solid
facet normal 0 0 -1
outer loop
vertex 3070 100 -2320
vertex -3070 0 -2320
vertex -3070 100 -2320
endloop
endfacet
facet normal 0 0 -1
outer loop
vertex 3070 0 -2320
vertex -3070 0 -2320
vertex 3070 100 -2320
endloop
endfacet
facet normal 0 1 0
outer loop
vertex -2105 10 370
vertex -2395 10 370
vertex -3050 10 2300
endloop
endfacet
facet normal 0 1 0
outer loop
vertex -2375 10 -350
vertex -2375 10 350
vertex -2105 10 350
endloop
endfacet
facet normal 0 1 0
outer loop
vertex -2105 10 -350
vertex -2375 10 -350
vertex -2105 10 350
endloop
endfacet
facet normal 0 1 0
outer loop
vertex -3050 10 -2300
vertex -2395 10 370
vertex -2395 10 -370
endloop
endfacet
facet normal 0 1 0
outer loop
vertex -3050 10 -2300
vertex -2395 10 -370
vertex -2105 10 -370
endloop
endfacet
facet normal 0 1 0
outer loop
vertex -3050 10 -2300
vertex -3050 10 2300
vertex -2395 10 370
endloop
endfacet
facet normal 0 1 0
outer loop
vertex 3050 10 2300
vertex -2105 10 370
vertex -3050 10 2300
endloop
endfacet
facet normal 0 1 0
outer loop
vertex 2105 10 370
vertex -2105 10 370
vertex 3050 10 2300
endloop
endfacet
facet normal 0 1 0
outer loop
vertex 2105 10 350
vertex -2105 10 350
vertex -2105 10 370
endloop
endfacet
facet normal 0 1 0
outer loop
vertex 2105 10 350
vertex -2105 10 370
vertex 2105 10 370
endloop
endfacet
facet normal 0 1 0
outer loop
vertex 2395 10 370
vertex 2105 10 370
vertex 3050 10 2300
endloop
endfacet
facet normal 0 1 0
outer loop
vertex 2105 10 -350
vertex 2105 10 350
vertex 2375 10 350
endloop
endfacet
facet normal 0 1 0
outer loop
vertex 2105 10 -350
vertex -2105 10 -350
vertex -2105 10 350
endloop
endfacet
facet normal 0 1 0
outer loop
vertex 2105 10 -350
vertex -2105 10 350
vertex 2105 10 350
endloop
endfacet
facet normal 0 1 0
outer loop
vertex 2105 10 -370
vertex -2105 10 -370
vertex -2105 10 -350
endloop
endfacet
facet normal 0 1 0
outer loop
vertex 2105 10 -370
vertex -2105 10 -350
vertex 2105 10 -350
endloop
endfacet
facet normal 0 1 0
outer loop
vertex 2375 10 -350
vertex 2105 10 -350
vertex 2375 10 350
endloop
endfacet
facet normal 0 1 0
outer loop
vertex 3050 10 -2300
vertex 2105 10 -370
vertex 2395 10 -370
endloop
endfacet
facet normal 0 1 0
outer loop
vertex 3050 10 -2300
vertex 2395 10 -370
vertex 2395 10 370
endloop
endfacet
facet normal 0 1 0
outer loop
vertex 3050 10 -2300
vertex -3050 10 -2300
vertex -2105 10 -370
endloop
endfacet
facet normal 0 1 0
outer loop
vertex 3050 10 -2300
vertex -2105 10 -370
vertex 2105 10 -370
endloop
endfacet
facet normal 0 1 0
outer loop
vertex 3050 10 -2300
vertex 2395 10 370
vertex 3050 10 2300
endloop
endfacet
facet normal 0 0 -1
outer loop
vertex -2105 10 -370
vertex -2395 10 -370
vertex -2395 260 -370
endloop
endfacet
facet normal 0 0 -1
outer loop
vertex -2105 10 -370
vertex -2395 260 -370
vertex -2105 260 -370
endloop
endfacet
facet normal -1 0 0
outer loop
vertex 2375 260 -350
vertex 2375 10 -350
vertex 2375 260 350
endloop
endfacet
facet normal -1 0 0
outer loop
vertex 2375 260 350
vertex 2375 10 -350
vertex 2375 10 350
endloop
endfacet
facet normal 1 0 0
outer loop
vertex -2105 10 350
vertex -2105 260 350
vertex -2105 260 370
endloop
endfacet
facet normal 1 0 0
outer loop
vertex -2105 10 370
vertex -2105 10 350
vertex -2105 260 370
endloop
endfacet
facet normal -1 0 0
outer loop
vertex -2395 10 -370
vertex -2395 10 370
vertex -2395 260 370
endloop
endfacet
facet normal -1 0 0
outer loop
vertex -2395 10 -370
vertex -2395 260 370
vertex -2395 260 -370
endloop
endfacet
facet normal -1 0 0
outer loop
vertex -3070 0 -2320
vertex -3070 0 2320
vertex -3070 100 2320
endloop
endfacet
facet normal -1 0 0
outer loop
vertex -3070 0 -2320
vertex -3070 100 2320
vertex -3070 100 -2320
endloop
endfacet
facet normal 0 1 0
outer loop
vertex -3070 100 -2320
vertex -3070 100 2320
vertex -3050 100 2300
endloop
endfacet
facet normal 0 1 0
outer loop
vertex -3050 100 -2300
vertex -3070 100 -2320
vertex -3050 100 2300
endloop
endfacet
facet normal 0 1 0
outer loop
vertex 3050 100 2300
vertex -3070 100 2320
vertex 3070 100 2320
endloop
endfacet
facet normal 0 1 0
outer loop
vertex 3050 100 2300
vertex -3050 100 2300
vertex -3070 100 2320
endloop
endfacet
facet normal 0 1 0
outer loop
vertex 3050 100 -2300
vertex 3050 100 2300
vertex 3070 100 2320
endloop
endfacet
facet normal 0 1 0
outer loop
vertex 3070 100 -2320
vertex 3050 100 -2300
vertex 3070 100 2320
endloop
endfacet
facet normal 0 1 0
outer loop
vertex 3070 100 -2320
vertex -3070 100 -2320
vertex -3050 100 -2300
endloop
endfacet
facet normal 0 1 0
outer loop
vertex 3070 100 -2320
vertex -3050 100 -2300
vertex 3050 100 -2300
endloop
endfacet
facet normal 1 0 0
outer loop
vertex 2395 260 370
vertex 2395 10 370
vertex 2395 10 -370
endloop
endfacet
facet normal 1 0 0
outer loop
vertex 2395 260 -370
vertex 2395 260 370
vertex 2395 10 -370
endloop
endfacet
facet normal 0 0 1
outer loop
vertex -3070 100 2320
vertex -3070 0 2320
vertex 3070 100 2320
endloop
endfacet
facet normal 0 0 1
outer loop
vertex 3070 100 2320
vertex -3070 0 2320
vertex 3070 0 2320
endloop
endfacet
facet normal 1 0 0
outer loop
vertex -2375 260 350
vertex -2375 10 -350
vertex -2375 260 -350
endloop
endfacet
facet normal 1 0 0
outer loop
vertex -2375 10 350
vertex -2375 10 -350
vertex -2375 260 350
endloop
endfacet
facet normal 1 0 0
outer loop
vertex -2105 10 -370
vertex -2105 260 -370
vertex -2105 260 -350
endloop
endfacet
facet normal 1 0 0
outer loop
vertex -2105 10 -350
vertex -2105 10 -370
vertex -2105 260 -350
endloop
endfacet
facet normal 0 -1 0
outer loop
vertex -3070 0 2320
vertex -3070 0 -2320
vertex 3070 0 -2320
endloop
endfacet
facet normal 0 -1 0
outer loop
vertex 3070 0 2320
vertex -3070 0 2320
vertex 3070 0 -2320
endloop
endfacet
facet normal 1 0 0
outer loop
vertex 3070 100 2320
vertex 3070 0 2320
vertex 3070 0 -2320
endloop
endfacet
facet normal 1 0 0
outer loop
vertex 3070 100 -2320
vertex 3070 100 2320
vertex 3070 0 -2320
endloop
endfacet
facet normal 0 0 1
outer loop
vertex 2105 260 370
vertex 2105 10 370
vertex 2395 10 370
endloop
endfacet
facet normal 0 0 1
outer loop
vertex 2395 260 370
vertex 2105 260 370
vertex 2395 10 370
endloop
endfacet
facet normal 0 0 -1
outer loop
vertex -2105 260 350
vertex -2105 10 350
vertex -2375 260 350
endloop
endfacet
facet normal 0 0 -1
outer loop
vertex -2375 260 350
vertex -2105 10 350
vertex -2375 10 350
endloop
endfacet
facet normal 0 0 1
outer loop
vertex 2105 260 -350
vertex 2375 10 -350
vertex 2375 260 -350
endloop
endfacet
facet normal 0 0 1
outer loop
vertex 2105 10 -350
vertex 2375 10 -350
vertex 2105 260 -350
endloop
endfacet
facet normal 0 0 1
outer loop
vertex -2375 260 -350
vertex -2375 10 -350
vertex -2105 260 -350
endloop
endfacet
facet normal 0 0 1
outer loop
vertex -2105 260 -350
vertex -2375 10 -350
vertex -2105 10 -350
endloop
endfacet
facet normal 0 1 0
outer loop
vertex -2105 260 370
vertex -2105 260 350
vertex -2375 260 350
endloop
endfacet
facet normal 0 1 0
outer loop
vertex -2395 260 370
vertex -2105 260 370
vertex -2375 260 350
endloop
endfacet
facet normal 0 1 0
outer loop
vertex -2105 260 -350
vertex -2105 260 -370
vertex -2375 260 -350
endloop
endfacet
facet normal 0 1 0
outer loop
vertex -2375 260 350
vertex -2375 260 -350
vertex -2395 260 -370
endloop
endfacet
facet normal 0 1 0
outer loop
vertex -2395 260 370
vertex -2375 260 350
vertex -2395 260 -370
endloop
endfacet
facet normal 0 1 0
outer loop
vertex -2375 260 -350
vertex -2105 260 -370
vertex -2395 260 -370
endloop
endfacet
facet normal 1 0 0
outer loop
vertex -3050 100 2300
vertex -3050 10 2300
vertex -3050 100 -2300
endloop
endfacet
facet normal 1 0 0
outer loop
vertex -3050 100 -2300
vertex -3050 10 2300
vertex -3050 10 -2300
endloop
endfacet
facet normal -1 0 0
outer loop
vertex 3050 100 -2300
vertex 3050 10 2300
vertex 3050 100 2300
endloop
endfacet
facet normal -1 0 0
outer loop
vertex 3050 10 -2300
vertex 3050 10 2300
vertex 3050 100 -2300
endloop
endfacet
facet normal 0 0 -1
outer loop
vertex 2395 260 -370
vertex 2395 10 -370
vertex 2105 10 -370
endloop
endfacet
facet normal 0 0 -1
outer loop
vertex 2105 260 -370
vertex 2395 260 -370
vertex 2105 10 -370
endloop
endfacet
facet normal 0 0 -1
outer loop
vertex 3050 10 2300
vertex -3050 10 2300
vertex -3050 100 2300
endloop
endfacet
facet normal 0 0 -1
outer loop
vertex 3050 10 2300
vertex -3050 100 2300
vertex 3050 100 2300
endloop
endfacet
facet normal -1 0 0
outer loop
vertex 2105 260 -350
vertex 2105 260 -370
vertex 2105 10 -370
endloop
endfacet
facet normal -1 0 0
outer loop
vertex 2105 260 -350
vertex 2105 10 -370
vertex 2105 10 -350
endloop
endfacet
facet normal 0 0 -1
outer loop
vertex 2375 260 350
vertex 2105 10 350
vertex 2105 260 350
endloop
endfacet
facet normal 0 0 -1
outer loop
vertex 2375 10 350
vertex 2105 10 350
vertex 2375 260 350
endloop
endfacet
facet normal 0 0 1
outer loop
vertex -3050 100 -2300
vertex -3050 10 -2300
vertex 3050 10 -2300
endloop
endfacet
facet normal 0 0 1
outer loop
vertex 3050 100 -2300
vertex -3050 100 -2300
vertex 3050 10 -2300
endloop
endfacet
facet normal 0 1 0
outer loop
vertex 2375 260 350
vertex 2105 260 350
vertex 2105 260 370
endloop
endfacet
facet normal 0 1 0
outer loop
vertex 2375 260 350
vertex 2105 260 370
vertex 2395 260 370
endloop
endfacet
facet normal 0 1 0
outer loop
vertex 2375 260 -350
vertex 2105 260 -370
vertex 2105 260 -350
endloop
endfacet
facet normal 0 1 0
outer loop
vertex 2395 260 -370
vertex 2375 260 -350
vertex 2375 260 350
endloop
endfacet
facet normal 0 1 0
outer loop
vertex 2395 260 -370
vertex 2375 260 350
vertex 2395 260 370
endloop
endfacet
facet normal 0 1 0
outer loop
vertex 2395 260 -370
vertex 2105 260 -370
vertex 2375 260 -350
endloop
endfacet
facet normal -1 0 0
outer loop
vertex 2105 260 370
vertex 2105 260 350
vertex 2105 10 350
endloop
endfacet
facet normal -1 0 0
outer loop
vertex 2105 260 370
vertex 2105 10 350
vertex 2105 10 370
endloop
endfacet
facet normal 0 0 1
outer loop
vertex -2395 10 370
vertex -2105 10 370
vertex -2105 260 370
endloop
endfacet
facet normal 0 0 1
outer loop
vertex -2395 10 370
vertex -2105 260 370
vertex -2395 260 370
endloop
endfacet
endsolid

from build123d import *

# Parameters (mm, degrees)
SKETCH1_W           = 6140
SKETCH1_H           = 4640
SKETCH1_W_2         = 6100
SKETCH1_H_2         = 4600
BOSS_EXTRUDE1_DEPTH = 100
SKETCH1_2_W         = 6100
SKETCH1_2_H         = 4600
BOSS_EXTRUDE2_DEPTH = 10
BOSS_EXTRUDE3_DEPTH = 250


with BuildPart() as part:
    # Sketch1 → Boss-Extrude1 (new body)
    with BuildSketch(Plane(origin=(0, 0, 0), x_dir=(1, 0, 0), z_dir=(0, 1, 0))):
        Rectangle(SKETCH1_W, SKETCH1_H)
        Rectangle(SKETCH1_W_2, SKETCH1_H_2, mode=Mode.SUBTRACT)
    extrude(amount=BOSS_EXTRUDE1_DEPTH)

    # Sketch1<2> → Boss-Extrude2 (add)
    with BuildSketch(Plane(origin=(0, 0, 0), x_dir=(1, 0, 0), z_dir=(0, 1, 0))):
        Rectangle(SKETCH1_2_W, SKETCH1_2_H)
    extrude(amount=BOSS_EXTRUDE2_DEPTH)

    # Sketch2 → Boss-Extrude3 (add)
    with BuildSketch(Plane(origin=(0, 10, 0), x_dir=(1, 0, 0), z_dir=(0, 1, 0))):
        Polygon((-2395, 370), (-2105, 370), (-2105, 350), (-2125, 350), (-2375, 350), (-2375, -350), (-2125, -350), (-2105, -350), (-2105, -370), (-2395, -370), align=None)
    boss_extrude3 = extrude(amount=BOSS_EXTRUDE3_DEPTH)

    # Mirror1: Boss-Extrude3 across plane
    add(boss_extrude3.mirror(Plane(origin=(0, 0, 0), x_dir=(0, 0, 1), z_dir=(1, 0, 0))))


solid = part.part
